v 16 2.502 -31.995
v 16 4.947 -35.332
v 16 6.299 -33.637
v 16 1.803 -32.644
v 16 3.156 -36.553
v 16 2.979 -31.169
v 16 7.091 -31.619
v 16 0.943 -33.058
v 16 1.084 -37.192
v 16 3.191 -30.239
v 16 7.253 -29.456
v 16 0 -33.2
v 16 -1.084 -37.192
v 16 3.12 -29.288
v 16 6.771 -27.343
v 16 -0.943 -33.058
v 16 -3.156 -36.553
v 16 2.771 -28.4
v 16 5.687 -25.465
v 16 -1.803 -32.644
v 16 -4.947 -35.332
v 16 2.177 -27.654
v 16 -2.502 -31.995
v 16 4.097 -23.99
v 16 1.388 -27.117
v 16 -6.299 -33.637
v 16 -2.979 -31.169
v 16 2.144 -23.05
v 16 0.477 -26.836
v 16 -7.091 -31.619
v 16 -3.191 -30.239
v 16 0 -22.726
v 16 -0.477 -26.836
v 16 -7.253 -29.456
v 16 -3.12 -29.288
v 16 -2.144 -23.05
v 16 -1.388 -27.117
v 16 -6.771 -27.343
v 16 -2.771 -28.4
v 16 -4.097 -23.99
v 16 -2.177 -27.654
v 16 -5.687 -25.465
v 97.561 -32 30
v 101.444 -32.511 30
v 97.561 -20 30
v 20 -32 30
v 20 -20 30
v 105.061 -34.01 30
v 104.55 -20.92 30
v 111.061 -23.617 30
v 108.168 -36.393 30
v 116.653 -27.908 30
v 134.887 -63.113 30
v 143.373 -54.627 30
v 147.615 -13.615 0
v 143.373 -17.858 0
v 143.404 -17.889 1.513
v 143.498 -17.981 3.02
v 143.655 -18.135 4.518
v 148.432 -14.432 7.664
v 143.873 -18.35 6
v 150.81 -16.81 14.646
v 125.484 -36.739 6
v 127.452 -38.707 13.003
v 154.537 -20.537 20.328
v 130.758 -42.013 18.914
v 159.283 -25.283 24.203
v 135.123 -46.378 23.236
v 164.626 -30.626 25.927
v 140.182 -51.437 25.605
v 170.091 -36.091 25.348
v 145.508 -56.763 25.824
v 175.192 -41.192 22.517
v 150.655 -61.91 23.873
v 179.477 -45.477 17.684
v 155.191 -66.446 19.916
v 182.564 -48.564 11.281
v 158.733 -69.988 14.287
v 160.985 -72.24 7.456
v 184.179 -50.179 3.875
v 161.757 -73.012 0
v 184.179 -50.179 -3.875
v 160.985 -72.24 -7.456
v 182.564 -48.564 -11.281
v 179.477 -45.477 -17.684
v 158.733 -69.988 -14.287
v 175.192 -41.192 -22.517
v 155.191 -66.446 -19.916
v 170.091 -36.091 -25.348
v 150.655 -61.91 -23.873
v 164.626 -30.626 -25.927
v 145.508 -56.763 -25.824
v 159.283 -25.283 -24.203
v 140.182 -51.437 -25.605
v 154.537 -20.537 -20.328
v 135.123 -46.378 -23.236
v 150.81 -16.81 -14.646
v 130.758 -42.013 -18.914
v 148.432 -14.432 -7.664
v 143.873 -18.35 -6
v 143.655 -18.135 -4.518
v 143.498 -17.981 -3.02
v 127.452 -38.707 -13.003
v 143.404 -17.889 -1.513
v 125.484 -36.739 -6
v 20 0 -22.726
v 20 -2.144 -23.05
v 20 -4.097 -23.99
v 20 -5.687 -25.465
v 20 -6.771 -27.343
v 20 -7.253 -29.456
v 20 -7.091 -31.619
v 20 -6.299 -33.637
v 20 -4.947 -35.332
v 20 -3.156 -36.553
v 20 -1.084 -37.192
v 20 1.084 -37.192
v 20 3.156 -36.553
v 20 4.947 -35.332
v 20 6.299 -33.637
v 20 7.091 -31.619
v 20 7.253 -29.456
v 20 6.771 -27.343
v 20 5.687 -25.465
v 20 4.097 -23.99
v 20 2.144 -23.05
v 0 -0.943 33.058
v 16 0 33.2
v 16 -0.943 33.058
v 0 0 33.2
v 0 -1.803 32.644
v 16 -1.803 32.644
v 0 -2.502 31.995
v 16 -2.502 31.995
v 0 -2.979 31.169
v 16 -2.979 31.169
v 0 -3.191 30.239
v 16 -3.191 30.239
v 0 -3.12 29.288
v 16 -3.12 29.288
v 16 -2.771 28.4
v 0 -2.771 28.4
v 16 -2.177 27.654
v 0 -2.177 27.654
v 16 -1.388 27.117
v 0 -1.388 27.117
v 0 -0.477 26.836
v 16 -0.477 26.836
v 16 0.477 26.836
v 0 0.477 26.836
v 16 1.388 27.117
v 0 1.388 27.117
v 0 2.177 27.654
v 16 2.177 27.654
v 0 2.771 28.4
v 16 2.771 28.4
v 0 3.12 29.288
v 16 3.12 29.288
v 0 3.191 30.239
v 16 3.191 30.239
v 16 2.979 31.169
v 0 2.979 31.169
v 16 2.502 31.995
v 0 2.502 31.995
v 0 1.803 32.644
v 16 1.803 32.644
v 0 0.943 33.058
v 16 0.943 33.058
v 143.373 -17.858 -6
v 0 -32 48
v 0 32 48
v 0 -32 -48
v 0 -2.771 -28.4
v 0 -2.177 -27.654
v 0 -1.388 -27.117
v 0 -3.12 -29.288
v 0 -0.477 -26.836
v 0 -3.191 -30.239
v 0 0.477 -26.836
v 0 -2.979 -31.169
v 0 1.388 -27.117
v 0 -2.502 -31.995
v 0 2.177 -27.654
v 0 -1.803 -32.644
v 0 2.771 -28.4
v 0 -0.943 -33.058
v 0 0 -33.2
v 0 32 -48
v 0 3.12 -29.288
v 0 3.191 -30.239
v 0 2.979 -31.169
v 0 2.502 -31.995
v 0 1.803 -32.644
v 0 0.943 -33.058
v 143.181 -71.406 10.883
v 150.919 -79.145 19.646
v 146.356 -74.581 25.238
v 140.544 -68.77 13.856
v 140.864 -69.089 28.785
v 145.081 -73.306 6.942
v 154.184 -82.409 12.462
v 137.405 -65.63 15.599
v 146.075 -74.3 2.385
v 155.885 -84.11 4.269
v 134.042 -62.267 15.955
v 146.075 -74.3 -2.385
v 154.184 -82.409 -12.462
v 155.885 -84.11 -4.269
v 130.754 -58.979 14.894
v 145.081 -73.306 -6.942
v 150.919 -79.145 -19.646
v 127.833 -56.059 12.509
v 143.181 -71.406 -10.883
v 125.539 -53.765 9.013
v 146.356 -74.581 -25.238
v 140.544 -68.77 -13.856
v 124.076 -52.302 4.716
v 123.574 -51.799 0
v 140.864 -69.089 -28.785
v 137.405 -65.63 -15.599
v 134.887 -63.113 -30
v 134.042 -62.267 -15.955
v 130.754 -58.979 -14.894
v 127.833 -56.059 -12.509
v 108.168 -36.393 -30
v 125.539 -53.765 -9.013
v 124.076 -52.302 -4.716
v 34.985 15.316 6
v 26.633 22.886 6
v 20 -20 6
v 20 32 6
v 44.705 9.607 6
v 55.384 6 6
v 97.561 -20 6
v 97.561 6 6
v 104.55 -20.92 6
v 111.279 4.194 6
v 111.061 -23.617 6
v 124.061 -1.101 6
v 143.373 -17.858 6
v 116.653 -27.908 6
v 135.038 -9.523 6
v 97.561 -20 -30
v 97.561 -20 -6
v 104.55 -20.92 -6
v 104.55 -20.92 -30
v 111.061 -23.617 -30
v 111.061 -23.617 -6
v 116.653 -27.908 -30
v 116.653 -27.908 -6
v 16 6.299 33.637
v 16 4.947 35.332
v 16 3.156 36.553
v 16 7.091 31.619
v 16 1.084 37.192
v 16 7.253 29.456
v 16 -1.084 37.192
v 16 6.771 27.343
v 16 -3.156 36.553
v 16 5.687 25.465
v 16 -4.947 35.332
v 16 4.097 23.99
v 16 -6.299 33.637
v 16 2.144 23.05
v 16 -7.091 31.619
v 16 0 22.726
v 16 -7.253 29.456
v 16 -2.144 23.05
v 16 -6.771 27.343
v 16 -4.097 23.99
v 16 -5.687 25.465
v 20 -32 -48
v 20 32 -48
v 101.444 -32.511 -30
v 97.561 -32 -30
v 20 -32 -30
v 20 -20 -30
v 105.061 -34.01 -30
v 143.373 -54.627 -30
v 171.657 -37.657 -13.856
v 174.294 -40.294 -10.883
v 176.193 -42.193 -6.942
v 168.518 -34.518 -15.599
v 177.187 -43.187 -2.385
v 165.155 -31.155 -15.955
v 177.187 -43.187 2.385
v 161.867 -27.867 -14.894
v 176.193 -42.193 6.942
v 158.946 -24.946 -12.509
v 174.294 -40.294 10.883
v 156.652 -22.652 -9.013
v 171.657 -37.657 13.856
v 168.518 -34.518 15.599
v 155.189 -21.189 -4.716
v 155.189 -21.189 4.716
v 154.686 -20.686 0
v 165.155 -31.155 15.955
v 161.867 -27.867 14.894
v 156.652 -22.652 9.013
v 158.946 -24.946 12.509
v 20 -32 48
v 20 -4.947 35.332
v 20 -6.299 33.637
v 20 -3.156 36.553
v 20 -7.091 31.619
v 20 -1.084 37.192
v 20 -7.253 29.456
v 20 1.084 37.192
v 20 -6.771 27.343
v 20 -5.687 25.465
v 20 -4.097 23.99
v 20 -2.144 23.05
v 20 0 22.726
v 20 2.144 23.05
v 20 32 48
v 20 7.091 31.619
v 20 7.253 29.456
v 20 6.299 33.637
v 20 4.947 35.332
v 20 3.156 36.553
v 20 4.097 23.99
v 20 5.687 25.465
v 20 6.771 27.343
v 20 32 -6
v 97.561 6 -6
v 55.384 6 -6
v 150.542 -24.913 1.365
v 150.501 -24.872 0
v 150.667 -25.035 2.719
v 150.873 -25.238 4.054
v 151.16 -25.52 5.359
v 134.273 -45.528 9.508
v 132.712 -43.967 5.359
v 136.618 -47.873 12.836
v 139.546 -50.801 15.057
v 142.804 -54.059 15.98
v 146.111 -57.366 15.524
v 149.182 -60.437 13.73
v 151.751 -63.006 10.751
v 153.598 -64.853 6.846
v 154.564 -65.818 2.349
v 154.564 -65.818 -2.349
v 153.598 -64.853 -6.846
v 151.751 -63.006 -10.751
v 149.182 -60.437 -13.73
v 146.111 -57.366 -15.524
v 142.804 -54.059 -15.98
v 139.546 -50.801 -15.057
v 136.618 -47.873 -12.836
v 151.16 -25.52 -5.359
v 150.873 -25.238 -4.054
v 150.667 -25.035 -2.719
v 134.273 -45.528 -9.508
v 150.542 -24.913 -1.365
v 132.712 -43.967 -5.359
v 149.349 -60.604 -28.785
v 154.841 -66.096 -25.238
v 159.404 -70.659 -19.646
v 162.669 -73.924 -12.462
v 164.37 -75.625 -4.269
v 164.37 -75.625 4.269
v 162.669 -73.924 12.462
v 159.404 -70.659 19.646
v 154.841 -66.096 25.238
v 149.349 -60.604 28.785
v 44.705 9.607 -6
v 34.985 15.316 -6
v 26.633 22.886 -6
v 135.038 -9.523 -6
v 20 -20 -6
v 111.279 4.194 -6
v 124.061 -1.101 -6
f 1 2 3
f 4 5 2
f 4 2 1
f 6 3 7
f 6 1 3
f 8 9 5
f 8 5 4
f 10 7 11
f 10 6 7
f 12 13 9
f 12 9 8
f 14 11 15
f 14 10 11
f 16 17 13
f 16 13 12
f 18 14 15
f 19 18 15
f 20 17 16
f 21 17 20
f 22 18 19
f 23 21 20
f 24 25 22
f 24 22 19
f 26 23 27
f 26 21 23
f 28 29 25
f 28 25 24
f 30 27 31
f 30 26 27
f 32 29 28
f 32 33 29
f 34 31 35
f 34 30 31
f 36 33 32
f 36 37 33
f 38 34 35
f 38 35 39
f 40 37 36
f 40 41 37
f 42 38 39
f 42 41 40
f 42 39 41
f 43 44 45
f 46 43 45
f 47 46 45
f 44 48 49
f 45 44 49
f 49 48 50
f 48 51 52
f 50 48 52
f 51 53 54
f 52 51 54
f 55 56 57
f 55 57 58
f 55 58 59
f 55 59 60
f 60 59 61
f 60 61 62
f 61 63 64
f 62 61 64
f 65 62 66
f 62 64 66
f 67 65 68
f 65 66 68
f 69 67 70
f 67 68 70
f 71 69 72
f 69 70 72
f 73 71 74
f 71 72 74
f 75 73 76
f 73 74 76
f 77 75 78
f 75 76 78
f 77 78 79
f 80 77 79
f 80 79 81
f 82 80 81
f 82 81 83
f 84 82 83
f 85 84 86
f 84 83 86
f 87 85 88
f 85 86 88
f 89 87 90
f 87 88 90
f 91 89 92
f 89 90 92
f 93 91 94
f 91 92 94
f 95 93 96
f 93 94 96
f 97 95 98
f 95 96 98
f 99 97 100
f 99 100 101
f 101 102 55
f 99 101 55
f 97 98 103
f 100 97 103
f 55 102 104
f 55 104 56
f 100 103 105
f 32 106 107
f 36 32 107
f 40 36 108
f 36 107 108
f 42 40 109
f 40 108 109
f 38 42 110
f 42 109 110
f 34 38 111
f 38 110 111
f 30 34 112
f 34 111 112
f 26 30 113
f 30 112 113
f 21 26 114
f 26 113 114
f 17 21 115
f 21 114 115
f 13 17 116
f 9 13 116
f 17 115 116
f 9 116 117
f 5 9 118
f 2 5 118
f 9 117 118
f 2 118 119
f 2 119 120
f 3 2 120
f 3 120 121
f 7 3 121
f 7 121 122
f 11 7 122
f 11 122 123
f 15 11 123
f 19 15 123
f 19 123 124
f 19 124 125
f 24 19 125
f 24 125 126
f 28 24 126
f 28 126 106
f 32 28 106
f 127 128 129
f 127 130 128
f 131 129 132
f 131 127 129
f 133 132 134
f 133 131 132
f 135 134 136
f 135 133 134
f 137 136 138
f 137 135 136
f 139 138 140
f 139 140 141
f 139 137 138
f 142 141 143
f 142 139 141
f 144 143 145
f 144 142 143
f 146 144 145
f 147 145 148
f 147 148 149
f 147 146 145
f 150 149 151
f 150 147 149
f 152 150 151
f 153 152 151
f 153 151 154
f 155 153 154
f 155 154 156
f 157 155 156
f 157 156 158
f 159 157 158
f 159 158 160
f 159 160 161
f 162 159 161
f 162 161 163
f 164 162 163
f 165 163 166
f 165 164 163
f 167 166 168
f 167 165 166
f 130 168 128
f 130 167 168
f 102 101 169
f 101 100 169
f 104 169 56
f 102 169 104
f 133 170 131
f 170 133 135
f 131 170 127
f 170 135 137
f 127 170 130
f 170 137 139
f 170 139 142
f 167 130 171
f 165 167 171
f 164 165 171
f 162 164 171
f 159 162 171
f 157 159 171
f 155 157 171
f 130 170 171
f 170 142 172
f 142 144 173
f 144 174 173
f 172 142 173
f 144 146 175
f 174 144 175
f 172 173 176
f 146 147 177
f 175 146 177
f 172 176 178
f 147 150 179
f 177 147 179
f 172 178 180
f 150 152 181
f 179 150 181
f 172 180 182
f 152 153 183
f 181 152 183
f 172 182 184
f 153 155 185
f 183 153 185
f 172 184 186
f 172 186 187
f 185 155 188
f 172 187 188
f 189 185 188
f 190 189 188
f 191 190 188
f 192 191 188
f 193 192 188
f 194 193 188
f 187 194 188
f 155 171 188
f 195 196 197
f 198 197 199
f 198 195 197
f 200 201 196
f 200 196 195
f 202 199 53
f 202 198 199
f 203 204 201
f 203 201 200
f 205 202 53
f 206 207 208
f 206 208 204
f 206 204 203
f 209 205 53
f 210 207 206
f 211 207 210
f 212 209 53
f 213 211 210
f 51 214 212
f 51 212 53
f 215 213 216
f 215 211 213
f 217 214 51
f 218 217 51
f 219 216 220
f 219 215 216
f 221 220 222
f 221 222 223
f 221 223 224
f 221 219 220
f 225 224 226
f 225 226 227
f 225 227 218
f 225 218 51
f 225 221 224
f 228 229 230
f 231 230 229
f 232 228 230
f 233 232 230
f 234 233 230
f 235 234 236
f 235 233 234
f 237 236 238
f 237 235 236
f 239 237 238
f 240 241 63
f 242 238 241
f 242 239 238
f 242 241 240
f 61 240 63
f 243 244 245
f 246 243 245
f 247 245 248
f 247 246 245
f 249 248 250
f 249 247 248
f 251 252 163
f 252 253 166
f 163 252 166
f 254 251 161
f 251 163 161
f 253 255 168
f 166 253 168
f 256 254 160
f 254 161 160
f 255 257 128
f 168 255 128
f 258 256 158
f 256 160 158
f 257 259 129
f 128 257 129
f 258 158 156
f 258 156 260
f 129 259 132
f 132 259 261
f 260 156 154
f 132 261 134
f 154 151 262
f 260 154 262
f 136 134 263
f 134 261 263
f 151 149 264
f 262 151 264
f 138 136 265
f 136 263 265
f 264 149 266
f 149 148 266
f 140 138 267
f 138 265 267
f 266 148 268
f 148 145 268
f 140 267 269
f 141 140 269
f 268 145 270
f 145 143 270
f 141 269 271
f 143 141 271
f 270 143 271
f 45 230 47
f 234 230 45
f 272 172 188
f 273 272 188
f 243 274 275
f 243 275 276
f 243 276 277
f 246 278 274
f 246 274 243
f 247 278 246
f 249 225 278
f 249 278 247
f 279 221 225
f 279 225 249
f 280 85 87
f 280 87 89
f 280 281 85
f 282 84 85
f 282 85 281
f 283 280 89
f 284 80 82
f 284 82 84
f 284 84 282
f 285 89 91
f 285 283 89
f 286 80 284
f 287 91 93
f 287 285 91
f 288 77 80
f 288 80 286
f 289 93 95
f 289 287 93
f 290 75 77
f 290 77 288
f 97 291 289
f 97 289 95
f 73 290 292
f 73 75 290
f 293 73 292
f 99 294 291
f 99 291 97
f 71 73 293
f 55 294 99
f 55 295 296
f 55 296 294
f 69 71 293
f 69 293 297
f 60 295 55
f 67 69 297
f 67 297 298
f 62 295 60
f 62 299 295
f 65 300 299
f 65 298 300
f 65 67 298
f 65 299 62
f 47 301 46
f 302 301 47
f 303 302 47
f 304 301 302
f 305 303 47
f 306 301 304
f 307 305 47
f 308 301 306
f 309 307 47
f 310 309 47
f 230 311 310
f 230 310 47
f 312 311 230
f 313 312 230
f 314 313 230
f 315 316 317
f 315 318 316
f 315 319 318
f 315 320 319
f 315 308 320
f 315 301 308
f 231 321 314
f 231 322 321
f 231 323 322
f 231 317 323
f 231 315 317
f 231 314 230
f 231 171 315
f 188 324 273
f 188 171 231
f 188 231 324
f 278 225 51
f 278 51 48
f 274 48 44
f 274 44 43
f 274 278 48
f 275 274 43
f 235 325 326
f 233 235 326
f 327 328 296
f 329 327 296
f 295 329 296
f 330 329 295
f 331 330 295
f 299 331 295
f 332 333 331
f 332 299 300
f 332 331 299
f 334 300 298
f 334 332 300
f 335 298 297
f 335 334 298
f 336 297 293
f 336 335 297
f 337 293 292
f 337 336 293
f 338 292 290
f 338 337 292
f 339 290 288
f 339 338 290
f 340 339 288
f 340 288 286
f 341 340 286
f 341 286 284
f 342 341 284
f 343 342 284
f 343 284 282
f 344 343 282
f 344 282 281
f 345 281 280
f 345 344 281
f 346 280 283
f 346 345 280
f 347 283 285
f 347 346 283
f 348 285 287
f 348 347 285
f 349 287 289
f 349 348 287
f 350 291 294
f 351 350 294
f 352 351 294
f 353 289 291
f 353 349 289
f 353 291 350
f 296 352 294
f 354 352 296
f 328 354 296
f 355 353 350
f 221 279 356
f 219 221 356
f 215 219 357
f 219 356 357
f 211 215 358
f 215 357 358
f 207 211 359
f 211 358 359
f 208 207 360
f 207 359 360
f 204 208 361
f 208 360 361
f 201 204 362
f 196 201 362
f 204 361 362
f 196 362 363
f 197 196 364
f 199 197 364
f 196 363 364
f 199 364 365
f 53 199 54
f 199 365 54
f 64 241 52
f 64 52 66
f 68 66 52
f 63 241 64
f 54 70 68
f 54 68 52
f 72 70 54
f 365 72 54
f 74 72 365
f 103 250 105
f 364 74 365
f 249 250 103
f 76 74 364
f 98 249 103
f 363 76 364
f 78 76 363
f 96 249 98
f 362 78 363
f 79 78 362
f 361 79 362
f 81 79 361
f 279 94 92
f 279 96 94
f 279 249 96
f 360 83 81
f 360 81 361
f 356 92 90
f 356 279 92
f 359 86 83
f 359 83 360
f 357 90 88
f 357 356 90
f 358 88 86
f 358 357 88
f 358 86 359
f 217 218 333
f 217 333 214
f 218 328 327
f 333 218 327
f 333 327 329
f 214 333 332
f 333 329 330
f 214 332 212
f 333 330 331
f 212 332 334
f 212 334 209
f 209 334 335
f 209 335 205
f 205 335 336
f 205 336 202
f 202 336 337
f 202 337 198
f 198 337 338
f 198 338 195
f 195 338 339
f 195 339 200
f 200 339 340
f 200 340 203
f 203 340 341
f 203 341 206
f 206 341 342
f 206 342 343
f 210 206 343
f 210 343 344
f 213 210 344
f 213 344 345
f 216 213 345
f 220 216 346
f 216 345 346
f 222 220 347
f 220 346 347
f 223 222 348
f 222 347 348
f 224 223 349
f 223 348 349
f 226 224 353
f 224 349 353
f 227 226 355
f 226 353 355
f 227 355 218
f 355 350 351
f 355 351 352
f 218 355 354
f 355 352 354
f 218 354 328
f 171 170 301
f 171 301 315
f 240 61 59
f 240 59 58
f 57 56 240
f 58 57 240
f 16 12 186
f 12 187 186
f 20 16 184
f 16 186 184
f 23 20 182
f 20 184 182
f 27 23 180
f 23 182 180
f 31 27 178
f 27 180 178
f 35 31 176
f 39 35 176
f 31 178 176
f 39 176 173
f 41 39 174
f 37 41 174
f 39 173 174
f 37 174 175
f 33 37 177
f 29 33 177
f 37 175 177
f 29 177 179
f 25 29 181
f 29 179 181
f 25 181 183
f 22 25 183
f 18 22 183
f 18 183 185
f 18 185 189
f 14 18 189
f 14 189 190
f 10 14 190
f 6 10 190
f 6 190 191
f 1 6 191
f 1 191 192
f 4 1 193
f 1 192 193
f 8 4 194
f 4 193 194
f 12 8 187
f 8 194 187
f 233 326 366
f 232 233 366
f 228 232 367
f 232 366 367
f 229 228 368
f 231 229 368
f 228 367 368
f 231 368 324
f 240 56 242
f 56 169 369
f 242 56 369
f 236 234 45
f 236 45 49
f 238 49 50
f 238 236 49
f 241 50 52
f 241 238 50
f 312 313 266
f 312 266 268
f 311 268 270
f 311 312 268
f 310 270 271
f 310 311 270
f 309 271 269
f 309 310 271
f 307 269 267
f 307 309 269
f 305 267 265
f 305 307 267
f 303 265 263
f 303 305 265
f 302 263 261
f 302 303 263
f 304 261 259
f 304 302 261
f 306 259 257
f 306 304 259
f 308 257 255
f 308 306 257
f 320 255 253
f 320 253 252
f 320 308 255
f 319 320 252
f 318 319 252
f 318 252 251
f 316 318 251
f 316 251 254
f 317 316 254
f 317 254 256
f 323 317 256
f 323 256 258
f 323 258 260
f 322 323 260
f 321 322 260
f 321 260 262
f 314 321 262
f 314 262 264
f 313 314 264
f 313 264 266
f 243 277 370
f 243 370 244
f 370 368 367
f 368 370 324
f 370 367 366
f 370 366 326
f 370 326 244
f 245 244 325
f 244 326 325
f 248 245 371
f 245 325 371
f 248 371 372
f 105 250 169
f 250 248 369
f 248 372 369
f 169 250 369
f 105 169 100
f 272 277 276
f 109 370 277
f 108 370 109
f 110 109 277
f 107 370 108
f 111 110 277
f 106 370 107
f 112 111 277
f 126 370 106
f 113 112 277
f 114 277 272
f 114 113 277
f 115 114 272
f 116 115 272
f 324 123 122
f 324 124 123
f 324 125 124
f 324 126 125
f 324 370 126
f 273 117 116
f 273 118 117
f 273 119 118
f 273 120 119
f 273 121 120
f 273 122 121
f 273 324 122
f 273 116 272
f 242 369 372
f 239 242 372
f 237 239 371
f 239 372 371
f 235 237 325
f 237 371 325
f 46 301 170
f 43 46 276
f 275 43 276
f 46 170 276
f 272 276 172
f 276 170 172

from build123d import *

# Parameters (mm, degrees)
SKETCH1_W                               = 96
SKETCH1_H                               = 64
BOSS_EXTRUDE1_DEPTH                     = 20
CBORE_FOR_M6_HEX_HEAD_BOLT1_D           = 6.4
CBORE_FOR_M6_HEX_HEAD_BOLT1_CBORE_D     = 14.547
CBORE_FOR_M6_HEX_HEAD_BOLT1_CBORE_DEPTH = 4
BOSS_EXTRUDE3_DEPTH                     = 60
CUT_EXTRUDE1_DEPTH                      = 12
SKETCH14_R                              = 26
SKETCH14_R_2                            = 16
BOSS_EXTRUDE4_DEPTH                     = 32
BOSS_EXTRUDE8_START                     = -12
BOSS_EXTRUDE8_DEPTH                     = 12
SKETCH17_R                              = 16
CUT_EXTRUDE2_DEPTH                      = 198.440406876


with BuildPart() as part:
    # Sketch1 → Boss-Extrude1 (new body)
    with BuildSketch(Plane(origin=(0, 0, 0), x_dir=(0, 0, -1), z_dir=(1, 0, 0))):
        Rectangle(SKETCH1_W, SKETCH1_H)
    extrude(amount=BOSS_EXTRUDE1_DEPTH)

    # CBORE for M6 Hex Head Bolt1 (through all)
    with Locations(Plane(origin=(20, 0, -30), x_dir=(0, 0, 1), z_dir=(1, 0, 0))):
        with Locations((0, 0)):
            cbore_for_m6_hex_head_bolt1 = CounterBoreHole(CBORE_FOR_M6_HEX_HEAD_BOLT1_D / 2, CBORE_FOR_M6_HEX_HEAD_BOLT1_CBORE_D / 2, CBORE_FOR_M6_HEX_HEAD_BOLT1_CBORE_DEPTH)

    # Mirror1: CBORE for M6 Hex Head Bolt1 across plane
    add(cbore_for_m6_hex_head_bolt1.mirror(Plane.XY), mode=Mode.SUBTRACT)

    # Sketch11 → Boss-Extrude3 (add)
    with BuildSketch(Plane(origin=(0, 0, -30), x_dir=(0, -1, 0), z_dir=(0, 0, 1))):
        with BuildLine():
            ThreePointArc((20, 97.56139982), (22.055252622, 107.893852494), (27.908116908, 116.653282912))
            Line((27.908116908, 116.653282912), (75.840620434, 164.585786438))
            Line((75.840620434, 164.585786438), (84.325901808, 156.100505063))
            Line((84.325901808, 156.100505063), (36.393398282, 108.168001538))
            ThreePointArc((36.393398282, 108.168001538), (33.141807012, 103.301651305), (32, 97.56139982))
            Line((32, 97.56139982), (32, 20))
            Line((32, 20), (20, 20))
            Line((20, 20), (20, 97.56139982))
        make_face()
    extrude(amount=BOSS_EXTRUDE3_DEPTH)

    # Sketch13 → Cut-Extrude1 (cut)
    with BuildSketch(Plane(origin=(44.372583002, 44.372583002, 0), x_dir=(0, 0, -1), z_dir=(0.7071067811865476, 0.7071067811865476, 0))):
        with BuildLine():
            Line((-30, -140.007142675), (-38.734920635, -140.007142675))
            Line((-38.734920635, -140.007142675), (-38.734920635, -179.207032884))
            Line((-38.734920635, -179.207032884), (30.889896781, -179.207032884))
            Line((30.889896781, -179.207032884), (30.889896781, -140.007142675))
            Line((30.889896781, -140.007142675), (30, -140.007142675))
            ThreePointArc((30, -140.007142675), (0, -170.007142675), (-30, -140.007142675))
        make_face()
    extrude(amount=-CUT_EXTRUDE1_DEPTH, mode=Mode.SUBTRACT)

    # Sketch14 → Boss-Extrude4 (add)
    with BuildSketch(Plane(origin=(44.372583002, 44.372583002, 0), x_dir=(0, 0, -1), z_dir=(0.7071067811865476, 0.7071067811865476, 0))):
        with Locations(Location((0, -140.007142675, 0), (0, 0, 90))):
            Circle(SKETCH14_R)
        with Locations(Location((0, -140.007142675, 0), (0, 0, 90))):
            Circle(SKETCH14_R_2, mode=Mode.SUBTRACT)
    extrude(amount=BOSS_EXTRUDE4_DEPTH)

    # Sketch16 → Boss-Extrude8 (add)
    with BuildSketch(Plane.XY.offset(6).offset(BOSS_EXTRUDE8_START)):
        with BuildLine():
            Line((20, 32), (20, -20))
            Line((20, -20), (97.56139982, -20))
            ThreePointArc((97.56139982, -20), (107.893852494, -22.055252622), (116.653282912, -27.908116908))
            Line((116.653282912, -27.908116908), (124.987806691, -36.242640687))
            Line((124.987806691, -36.242640687), (132.712452622, -43.967286618))
            Line((132.712452622, -43.967286618), (151.159621824, -25.520117415))
            Line((151.159621824, -25.520117415), (143.372583002, -17.857864376))
            Line((143.372583002, -17.857864376), (135.038059223, -9.523340597))
            ThreePointArc((135.038059223, -9.523340597), (117.843621735, 1.965615223), (97.56139982, 6))
            Line((97.56139982, 6), (55.38418899, 6))
            ThreePointArc((55.38418899, 6), (34.984926343, 15.315732711), (20, 32))
        make_face()
    extrude(amount=BOSS_EXTRUDE8_DEPTH)

    # Sketch17 → Cut-Extrude2 (cut, through all)
    with BuildSketch(Plane(origin=(67, 67, 0), x_dir=(0, 0, -1), z_dir=(0.7071067811865477, 0.7071067811865475, 0))):
        with Locations(Location((0, -140.007142675, 0), (0, 0, 90))):
            Circle(SKETCH17_R)
    extrude(amount=-CUT_EXTRUDE2_DEPTH, mode=Mode.SUBTRACT)


solid = part.part
